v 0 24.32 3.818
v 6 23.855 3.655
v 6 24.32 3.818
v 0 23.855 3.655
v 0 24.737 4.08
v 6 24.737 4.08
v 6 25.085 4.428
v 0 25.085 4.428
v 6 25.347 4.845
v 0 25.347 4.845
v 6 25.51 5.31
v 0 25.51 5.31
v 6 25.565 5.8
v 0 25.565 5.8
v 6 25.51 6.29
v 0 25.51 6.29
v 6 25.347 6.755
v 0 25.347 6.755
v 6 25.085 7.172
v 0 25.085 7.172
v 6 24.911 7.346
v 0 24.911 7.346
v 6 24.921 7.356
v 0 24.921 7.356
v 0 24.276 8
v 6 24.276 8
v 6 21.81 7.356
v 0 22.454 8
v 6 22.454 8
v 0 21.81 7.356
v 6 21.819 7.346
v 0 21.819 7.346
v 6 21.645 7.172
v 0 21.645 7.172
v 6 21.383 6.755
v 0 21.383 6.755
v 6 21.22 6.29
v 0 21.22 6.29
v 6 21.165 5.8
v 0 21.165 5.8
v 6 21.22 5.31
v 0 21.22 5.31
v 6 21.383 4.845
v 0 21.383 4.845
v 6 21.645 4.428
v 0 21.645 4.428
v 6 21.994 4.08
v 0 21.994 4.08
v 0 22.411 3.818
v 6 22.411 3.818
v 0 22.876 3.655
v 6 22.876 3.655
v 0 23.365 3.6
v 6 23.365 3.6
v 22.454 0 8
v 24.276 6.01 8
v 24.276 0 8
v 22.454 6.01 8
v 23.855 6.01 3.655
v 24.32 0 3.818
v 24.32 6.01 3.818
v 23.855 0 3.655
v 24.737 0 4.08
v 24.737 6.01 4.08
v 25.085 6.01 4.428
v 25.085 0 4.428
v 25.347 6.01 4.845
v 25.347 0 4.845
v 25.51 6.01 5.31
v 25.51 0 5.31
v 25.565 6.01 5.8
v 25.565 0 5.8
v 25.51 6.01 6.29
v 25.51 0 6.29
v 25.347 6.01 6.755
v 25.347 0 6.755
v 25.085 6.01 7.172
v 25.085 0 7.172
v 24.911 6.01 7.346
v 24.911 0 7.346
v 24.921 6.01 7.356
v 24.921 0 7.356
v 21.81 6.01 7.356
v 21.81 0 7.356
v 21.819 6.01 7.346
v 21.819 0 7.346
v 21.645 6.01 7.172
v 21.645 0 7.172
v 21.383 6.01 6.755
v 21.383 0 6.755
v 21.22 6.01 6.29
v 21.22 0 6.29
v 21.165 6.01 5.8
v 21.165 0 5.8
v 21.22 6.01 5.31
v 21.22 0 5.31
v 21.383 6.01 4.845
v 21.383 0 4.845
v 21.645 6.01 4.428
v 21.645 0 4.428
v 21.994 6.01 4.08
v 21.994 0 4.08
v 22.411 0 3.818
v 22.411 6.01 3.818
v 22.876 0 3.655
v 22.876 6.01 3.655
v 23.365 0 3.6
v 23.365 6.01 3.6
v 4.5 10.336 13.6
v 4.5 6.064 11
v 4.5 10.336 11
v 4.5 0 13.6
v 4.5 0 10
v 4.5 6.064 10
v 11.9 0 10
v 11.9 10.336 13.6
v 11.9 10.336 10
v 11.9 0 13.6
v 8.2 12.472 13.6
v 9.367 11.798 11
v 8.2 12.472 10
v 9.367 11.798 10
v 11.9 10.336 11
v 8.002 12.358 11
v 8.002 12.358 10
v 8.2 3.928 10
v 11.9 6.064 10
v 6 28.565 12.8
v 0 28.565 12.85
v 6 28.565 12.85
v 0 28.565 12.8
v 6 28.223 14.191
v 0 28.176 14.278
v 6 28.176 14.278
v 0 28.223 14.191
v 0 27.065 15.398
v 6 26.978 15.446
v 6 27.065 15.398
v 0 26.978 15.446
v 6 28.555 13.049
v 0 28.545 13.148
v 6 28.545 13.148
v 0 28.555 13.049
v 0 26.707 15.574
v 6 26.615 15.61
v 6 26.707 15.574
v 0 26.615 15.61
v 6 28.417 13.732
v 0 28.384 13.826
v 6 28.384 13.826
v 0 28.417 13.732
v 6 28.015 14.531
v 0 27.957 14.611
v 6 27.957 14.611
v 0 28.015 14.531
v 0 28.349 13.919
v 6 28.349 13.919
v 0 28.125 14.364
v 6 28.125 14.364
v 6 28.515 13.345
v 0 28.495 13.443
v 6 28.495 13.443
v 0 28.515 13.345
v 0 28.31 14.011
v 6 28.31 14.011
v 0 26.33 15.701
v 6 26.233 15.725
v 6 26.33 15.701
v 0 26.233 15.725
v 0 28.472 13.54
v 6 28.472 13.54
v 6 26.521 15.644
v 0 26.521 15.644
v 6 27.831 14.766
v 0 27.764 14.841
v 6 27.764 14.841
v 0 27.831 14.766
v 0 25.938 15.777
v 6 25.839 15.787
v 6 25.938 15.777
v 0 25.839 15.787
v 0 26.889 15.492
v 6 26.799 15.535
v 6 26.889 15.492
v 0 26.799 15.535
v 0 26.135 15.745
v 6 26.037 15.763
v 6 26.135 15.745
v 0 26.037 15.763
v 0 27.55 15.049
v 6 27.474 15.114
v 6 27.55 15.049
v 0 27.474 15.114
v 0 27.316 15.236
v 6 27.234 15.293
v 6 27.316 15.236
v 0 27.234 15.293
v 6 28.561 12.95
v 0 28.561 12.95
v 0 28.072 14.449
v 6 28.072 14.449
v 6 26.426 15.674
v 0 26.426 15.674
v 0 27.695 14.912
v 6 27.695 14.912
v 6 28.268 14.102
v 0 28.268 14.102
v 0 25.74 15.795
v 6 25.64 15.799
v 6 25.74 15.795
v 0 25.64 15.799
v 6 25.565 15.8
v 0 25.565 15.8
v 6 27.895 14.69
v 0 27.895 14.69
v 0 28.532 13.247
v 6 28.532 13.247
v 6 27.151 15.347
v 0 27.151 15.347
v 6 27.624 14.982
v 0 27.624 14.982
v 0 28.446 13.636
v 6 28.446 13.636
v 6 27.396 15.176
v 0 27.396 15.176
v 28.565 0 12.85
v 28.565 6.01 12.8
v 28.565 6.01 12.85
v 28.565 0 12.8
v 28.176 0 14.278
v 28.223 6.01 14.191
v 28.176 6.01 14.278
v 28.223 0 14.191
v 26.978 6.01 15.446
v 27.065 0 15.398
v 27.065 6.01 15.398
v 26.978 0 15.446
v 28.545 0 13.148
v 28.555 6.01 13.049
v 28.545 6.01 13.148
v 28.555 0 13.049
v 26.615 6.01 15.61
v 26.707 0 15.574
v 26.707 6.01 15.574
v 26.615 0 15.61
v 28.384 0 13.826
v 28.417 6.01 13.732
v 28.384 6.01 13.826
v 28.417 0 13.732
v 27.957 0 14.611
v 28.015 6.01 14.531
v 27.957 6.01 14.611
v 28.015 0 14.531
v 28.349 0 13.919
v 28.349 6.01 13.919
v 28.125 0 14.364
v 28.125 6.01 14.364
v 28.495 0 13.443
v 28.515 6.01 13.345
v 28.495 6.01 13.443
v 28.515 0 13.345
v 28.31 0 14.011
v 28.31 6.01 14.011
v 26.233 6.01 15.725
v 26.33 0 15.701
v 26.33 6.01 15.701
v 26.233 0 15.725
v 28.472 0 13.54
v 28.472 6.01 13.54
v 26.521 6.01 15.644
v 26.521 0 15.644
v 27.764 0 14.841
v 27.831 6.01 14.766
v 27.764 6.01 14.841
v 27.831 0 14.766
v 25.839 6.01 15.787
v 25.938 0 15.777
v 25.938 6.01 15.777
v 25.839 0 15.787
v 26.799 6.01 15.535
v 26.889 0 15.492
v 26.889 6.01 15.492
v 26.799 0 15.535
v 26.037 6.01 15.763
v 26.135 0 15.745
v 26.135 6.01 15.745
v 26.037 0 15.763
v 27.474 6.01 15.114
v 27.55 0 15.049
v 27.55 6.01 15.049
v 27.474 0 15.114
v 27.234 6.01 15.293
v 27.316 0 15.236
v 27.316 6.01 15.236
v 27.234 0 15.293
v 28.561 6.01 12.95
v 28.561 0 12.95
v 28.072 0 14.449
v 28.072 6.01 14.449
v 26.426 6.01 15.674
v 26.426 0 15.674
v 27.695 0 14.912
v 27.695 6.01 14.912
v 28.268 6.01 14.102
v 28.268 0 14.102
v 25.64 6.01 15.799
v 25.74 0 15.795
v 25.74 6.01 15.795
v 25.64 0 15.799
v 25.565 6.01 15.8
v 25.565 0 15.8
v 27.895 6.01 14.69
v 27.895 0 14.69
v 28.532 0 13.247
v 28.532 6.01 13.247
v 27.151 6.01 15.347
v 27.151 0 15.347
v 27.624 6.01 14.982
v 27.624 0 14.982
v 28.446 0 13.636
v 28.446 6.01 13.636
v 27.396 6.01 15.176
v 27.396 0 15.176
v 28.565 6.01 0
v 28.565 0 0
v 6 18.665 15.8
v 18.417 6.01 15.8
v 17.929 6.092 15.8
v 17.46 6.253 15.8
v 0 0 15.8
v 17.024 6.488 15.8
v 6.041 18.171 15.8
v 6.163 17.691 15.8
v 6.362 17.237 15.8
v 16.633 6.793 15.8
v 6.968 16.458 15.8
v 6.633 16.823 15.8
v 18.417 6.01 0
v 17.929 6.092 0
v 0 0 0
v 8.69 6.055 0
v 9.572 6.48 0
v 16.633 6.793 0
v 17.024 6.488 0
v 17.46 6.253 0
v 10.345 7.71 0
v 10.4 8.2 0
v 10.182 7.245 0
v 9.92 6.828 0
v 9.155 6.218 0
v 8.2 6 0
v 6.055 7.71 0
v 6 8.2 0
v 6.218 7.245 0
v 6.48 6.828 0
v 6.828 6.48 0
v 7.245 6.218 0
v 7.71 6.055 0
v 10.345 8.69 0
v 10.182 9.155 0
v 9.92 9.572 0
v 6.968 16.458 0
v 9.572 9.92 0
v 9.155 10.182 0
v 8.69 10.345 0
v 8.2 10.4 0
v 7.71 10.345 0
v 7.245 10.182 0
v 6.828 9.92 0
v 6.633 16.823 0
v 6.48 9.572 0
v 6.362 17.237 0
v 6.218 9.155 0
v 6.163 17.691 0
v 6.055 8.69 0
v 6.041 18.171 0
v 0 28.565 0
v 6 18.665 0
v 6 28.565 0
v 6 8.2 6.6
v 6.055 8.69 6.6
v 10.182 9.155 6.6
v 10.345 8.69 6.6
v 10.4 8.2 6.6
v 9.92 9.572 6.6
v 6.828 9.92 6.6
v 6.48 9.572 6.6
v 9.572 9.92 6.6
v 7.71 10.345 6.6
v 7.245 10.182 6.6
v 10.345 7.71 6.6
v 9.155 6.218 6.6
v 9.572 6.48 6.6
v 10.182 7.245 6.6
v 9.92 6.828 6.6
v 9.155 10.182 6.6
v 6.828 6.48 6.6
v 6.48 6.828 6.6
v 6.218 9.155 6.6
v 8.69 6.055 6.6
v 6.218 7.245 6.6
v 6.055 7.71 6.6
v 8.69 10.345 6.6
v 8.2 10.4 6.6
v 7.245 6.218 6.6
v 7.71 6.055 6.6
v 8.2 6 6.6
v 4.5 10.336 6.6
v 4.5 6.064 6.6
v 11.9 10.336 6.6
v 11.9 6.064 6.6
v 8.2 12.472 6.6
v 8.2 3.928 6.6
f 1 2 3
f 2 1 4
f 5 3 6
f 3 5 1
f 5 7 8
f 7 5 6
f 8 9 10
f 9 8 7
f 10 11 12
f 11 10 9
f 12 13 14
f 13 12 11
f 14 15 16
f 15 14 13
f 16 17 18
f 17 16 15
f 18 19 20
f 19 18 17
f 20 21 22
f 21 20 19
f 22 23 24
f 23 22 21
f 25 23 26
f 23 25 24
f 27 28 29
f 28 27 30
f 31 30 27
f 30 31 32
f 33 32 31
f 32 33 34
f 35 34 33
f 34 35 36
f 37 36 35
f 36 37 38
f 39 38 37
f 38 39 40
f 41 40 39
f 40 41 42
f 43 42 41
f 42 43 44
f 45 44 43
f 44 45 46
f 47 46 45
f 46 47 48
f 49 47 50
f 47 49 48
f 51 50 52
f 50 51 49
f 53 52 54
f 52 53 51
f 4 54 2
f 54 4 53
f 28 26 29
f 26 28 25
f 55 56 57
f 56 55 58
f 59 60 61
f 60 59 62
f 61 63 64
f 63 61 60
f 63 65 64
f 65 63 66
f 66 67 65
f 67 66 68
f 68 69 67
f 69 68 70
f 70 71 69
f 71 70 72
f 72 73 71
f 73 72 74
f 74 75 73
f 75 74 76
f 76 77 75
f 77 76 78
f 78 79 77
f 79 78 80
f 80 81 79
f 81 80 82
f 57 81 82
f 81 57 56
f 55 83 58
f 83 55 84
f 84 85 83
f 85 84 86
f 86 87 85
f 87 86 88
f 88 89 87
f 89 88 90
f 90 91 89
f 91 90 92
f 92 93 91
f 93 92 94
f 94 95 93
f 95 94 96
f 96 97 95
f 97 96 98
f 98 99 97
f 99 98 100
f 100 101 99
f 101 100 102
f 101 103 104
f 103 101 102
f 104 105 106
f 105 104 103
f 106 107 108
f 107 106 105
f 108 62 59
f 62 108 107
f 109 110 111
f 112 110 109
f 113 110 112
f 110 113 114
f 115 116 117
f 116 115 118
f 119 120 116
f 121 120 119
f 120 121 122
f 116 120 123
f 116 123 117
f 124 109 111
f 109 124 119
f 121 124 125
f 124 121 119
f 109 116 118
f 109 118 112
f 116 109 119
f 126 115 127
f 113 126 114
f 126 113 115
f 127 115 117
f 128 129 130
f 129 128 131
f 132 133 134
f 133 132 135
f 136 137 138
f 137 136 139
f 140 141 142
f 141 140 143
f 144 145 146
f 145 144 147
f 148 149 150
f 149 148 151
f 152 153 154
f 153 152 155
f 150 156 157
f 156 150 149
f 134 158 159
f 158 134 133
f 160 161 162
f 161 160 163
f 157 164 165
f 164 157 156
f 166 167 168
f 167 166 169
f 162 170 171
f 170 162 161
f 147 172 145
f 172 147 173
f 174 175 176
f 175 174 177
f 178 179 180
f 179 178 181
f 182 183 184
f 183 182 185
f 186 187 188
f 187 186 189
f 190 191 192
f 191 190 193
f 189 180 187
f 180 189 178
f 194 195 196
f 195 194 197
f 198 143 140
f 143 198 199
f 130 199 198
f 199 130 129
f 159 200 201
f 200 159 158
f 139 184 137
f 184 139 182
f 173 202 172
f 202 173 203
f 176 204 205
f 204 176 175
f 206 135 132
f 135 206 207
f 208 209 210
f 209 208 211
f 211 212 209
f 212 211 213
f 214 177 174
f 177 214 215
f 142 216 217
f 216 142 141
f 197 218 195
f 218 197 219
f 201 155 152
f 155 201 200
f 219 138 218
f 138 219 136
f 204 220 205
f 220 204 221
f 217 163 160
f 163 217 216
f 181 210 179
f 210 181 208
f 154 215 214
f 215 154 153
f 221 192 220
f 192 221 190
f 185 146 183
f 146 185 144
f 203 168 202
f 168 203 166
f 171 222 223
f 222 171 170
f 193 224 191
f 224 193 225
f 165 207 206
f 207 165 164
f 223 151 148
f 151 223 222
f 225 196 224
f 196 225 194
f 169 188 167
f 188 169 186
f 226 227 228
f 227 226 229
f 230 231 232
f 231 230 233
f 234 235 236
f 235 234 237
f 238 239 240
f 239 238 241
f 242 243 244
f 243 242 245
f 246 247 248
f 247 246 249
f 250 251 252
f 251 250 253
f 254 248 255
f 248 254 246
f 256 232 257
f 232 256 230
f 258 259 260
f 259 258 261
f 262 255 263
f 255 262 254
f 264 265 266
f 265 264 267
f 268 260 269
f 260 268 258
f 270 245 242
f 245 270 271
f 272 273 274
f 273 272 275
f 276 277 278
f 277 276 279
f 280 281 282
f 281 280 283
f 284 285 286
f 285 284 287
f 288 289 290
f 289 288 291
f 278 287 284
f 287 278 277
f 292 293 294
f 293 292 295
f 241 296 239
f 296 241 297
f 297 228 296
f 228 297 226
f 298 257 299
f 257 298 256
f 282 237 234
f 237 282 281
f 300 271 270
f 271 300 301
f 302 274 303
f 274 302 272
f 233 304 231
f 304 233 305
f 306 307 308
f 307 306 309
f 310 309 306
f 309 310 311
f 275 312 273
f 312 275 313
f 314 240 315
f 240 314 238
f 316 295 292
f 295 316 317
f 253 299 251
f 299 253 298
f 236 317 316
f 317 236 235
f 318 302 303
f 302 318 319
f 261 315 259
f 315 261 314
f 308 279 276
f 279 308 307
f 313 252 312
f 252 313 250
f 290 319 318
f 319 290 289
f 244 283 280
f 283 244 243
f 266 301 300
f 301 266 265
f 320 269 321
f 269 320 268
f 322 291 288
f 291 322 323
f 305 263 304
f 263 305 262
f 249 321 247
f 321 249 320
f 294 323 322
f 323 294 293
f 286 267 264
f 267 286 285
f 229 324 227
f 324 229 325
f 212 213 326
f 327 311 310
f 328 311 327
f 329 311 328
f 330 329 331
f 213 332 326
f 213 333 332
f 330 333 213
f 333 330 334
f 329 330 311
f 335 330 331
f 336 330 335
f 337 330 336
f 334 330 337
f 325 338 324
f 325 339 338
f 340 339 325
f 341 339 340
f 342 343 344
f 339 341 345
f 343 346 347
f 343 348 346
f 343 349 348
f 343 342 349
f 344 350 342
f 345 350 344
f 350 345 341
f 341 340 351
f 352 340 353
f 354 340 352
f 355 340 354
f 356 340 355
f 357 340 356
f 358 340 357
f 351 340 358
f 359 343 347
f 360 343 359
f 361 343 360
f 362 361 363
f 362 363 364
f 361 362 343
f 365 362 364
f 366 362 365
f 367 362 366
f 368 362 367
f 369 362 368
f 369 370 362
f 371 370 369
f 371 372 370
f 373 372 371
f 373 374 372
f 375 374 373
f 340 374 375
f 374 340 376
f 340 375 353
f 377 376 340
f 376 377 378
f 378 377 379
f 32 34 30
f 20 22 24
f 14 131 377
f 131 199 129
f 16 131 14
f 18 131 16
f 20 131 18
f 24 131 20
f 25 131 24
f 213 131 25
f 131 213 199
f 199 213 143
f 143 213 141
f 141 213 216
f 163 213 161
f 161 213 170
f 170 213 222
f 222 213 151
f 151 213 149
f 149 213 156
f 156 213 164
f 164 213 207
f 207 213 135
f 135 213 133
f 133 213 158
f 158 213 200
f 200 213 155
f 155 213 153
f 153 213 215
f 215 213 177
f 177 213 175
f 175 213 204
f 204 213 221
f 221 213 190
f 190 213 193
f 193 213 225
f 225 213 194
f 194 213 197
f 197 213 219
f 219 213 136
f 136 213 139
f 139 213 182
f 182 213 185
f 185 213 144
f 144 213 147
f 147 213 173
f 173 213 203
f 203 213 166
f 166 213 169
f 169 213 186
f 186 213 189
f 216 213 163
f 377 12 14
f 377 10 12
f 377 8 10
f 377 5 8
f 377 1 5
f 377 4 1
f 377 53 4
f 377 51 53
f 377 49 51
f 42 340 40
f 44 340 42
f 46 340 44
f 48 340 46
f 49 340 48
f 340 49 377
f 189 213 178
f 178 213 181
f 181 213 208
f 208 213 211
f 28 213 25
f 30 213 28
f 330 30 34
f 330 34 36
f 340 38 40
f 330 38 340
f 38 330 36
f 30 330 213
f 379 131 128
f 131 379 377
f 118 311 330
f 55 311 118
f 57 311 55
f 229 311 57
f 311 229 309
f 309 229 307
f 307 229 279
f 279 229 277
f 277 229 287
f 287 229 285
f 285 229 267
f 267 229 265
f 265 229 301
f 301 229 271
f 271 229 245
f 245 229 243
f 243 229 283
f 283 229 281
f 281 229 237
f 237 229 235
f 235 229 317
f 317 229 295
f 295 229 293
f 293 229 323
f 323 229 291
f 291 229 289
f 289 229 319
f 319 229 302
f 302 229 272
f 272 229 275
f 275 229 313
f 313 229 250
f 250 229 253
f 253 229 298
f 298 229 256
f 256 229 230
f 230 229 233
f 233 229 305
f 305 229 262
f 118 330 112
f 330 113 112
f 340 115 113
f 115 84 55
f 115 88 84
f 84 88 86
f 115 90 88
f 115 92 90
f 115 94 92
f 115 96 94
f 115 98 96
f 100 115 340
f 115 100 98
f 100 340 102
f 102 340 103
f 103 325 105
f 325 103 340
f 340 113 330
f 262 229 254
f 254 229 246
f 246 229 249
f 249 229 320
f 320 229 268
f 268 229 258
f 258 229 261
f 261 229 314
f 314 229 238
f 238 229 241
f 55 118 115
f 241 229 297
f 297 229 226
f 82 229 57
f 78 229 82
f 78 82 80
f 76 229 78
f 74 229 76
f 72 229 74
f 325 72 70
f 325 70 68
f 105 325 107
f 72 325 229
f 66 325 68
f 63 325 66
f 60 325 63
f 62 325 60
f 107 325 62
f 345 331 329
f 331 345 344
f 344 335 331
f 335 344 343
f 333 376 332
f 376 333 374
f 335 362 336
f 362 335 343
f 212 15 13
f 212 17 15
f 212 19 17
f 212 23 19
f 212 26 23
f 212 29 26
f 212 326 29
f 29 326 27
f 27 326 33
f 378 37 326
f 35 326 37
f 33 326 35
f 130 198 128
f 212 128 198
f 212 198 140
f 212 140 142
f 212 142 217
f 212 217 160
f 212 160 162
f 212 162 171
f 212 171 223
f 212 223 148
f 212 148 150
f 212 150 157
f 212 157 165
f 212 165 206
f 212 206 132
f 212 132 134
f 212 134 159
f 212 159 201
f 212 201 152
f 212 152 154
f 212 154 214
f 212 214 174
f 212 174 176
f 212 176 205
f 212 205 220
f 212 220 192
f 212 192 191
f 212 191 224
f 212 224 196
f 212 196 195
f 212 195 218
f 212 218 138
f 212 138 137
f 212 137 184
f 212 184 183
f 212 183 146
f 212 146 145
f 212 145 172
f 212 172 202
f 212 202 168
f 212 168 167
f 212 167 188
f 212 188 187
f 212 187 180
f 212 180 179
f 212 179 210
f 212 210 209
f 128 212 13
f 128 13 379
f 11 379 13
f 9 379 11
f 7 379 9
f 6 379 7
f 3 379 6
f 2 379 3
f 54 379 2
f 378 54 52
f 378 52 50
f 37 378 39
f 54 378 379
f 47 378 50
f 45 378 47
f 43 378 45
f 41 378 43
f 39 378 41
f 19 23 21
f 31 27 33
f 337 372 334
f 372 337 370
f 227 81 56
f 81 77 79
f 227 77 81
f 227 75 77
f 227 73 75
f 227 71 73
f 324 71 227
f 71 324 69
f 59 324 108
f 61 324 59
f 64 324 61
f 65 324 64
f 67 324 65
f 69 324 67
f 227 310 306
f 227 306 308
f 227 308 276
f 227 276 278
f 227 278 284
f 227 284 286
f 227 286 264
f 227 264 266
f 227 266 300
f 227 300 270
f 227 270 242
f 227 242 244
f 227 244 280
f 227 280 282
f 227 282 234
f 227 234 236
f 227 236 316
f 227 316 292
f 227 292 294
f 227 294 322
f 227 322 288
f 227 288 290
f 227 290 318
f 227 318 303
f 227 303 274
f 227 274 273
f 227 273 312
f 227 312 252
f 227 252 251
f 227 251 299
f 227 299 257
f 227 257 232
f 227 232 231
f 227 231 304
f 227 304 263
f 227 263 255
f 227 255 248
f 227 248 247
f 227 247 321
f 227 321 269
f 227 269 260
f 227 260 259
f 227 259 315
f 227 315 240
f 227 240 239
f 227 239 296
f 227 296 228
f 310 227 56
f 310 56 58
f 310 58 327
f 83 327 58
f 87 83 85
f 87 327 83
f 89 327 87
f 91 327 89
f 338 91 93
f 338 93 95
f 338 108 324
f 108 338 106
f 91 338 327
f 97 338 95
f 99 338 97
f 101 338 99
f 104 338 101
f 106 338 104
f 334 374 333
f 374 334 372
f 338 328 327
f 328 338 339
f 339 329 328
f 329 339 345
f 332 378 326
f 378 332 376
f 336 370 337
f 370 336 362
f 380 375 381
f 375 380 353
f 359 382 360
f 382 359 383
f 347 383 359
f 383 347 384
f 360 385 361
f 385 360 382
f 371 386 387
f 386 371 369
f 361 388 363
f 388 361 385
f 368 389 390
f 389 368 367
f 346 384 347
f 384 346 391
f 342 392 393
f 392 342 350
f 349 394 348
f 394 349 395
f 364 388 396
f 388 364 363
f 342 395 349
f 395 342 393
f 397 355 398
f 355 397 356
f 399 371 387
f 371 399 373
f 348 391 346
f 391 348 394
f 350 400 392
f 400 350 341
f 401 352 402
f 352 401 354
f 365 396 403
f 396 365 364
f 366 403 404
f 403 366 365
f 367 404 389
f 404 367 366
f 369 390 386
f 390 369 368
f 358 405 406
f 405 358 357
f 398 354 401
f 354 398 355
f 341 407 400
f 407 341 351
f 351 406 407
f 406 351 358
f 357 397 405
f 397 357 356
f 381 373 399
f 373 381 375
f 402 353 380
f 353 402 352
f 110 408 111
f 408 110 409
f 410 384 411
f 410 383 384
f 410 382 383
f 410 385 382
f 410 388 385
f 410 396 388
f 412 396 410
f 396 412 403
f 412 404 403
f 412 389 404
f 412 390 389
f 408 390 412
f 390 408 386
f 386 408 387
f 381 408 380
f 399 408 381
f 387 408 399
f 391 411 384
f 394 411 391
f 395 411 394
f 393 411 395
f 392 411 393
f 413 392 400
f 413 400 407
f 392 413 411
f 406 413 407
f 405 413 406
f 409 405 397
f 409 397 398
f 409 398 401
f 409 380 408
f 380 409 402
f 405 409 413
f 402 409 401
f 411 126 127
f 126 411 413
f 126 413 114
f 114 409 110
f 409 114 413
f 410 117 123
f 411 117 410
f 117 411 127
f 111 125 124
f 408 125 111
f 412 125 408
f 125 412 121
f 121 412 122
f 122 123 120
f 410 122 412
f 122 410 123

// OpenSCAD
// file: functions.scad
/*******************************************************************

This OpenSCAD code and its rendered 3D model are part of the

	Kühling&Kühling RepRap Industrial 3D Printer


All details, BOM, assembling instructions and latest sources:
	http://kuehlingkuehling.de

Designed and developed by:
	Jonas Kühling <mail@jonaskuehling.de>
	Simon Kühling <mail@simonkuehling.de>

Licensed under:
	Creative Commons Attribution-ShareAlike
	CC BY-SA 3.0
	http://creativecommons.org/licenses/by-sa/3.0/

*******************************************************************/

module teardrop (r=4.5,h=20,alpha=45,teardropcorner=0,fulldrop=0){		// tear drop hole for top-centering
											// use teardropcorner=1 for bottom horizontal corners
	render()
	translate([-h/2,0,0])
		rotate([-270,0+(teardropcorner*180),90])
			difference(){
				linear_extrude(height=h){
					circle(r);
					polygon(points=[[0,0],[r*cos(alpha),r*sin(alpha)],[0,r/sin(alpha)],[-r*cos(alpha),r*sin(alpha)]], paths=[[0,1,2,3]]);
				}
				if(fulldrop==0) 
					translate([0,(r/sin(alpha))/2+r,h/2]) cube([2*r+2,r/sin(alpha),h+2],center=true);
			}
}

//teardrop(4.5,22,fulldrop=true);



module teardropcentering (r=4.5,h=20,alpha=45){				// tear drop hole for top-centering
	centering_offset_factor = 1.1;
	render()
	translate([-h/2,0,0])
		rotate([-270,0,90])
			difference(){
				linear_extrude(height=h){
					circle(r, $fn=24);
					polygon(points=[[0,0],[r*cos(alpha),r*sin(alpha)],[0,r/sin(alpha)],[-r*cos(alpha),r*sin(alpha)]], paths=[[0,1,2,3]]);
				}
				translate([0,(r/sin(alpha))/2+r*centering_offset_factor,h/2]) cube([2*r+2,r/sin(alpha),h+2],center=true);
			}
}

//teardropcentering();



module teardropcentering_half (r=4.5,h=20, bottom=0,alpha=45){				// tear drop hole for top-centering
																// upper half (bottom=0) or bottom half (bottom=1)
	centering_offset_factor = 1.2;
	render()
	translate([-h/2,0,0])
		rotate([-270,0,90])
			difference(){
				linear_extrude(height=h){
					circle(r, $fn=24);
					polygon(points=[[0,0],[r*cos(alpha),r*sin(alpha)],[0,r/sin(alpha)],[-r*cos(alpha),r*sin(alpha)]], paths=[[0,1,2,3]]);
				}
				translate([0,(r/sin(alpha))/2+r*centering_offset_factor,h/2]) cube([2*r+2,r/sin(alpha),h+2],center=true);
				translate([0,-(r*centering_offset_factor)/2-0.5+bottom*(r*centering_offset_factor+1),h/2]) cube([2*r+2,r*centering_offset_factor+1,h+2],center=true);
			}
}

//teardropcentering_half(bottom=0);


module polyhole(d,h){
	n = max(round(2 * d),3);
	cylinder(h = h, r = (d / 2) / cos (180 / n), $fn = n, center=true);
}



module roundcorner(radius,edge_length){
	render()
	translate([0,0,-1])
		difference(){
			translate([-1,-1,0])
				cube(size = [radius+1,radius+1,edge_length+2], center = false);
			translate(v = [radius,radius,-1])
				cylinder(h = edge_length+4, r=radius, center=false,$fs=0.1);
		}
}

//roundcorner(5,5);



module roundcorner_tear(radius,edge_length){
	render()
	difference(){
		translate([-1,-1,-1])
			cube(size = [edge_length+2, radius+1, radius+1], center = false);
		translate([(edge_length+4)/2-2, radius, radius])
			teardrop(radius, edge_length+4,teardropcorner=1);
	}
}

//roundcorner_tear(8,20);


module roundedge_tear(radius){
	render()
	difference(){
		translate([-1,-1,-1])
			cube(size = [radius+1, radius+1, radius+1], center = false);
		translate([radius,radius,radius])
			union(){
				sphere(r=radius, $fs=0.1);
				translate([0,0,-radius])
					cylinder(r1=(radius*sin(45))-(radius-(radius*sin(45))),r2=radius*sin(45),h=(radius-(radius*sin(45))), $fs=0.1);
			}
	}
}

//roundedge_tear(20);



module roundedge(radius){
	render()
	difference(){
		translate([-1,-1,-1])
			cube(size = [radius+1, radius+1, radius+1], center = false);
		translate([radius,radius,radius])
			sphere(r=radius, $fs=0.1);
	}
}

//roundedge(5);


module nut_trap(nut_wrench_size,trap_height,vertical=0, clearance=0.2,center=true){		// M3 wrench size = 5.5
	radius = cornerdiameter(nut_wrench_size+2*clearance) /2;
	rotate([0,vertical*90,0])
		cylinder(h = trap_height, r = radius, center=center, $fn = 6);
}

//nut_trap(5,5,0);

module nut_slot(nut_wrench_size,nut_height, nut_elevation,vertical=0, clearance=0.2){		// M3 wrench size = 5.5
	radius = cornerdiameter(nut_wrench_size+2*clearance) /2;
	slot_height = nut_height+2*clearance;
	slot_width = nut_wrench_size+2*clearance;
	rotate([0,vertical*270,0]){
		cylinder(h = slot_height, r = radius, center=true, $fn = 6);
		translate([0,-slot_width/2,-slot_height/2]) cube([nut_elevation+1,slot_width,slot_height]);
	}
}

//nut_slot(5.5,3,4,1);

function cornerdiameter(wrench_size) =  2* ((wrench_size)/2)/ cos(180/6);
function cornerdiameter_8(wrench_size) =  2* ((wrench_size)/2)/ cos(180/8);
// main file
/*******************************************************************

This OpenSCAD code and its rendered 3D model are part of the

	Kühling&Kühling RepRap Industrial 3D Printer


All details, BOM, assembling instructions and latest sources:
	http://kuehlingkuehling.de

Designed and developed by:
	Jonas Kühling <mail@jonaskuehling.de>
	Simon Kühling <mail@simonkuehling.de>

Licensed under:
	Creative Commons Attribution-ShareAlike
	CC BY-SA 3.0
	http://creativecommons.org/licenses/by-sa/3.0/

*******************************************************************/

include <configuration.scad>



angle();



module angle(){
	difference(){
		union(){

			// main body
			cube([frame_angle_side,frame_angle_side,frame_angle_width]);
		}

		// cut off
		hull(){
			translate([2*wall+wall,2*wall+(frame_screw_dia+2*clearance)+(((frame_screw_dia/2+clearance)+wall)/sin(45))+((frame_screw_dia/2+clearance)/sin(45)-(frame_screw_dia/2+clearance)),-1])
				cylinder(r=wall,h=frame_angle_width+2);
			translate([2*wall+(frame_screw_dia+2*clearance)+(((frame_screw_dia/2+clearance)+wall)/sin(45))+((frame_screw_dia/2+clearance)/sin(45)-(frame_screw_dia/2+clearance)),2*wall+wall,-1])
				cylinder(r=wall,h=frame_angle_width+2);
			translate([2*wall+wall,frame_angle_side+wall,-1])
				cylinder(r=wall,h=frame_angle_width+2);
			translate([frame_angle_side+wall,2*wall+wall,-1])
				cylinder(r=wall,h=frame_angle_width+2);
			translate([frame_angle_side+wall,frame_angle_side+wall,-1])
				cylinder(r=wall,h=frame_angle_width+2);

		}

		// frame mount screw holes
		for(i=[0,1])
			rotate([0,0,i*(-90)])
				mirror([i,0,0]){
					translate([frame_angle_side/2,frame_angle_side-(wall+clearance+frame_screw_dia/2),frame_angle_width-frame_width/2])
						teardrop(frame_screw_dia/2+clearance,frame_angle_side+2);
// for OLD version with two screws for each side
//					translate([frame_angle_side/2,frame_angle_side-(wall+clearance+frame_screw_dia/2+frame_screw_washer_dia/2+wall+frame_screw_washer_dia/2),frame_angle_width-frame_width/2])
//						teardrop(frame_screw_dia/2+clearance,frame_angle_side+2);
				}

		// frame enclosure mount hole + nut trap
		translate([2*wall+clearance+frame_screw_dia/2,2*wall+clearance+frame_screw_dia/2,frame_angle_width-frame_width-frame_screw_washer_thickness])
			cylinder(r=frame_screw_dia/2+clearance,h=frame_enclosure_screw_length);
		translate([2*wall+clearance+frame_screw_dia/2,2*wall+clearance+frame_screw_dia/2,frame_angle_width-frame_width+frame_enclosure_screw_length-frame_screw_washer_thickness-(frame_screw_nut_height+clearance+1)/2+1])
			rotate([0,0,-90])
				nut_trap(frame_screw_nut_wrench,frame_screw_nut_height+clearance+1);
		translate([2*wall+clearance+frame_screw_dia/2,2*wall+clearance+frame_screw_dia/2,frame_angle_width-frame_width+frame_enclosure_screw_length-frame_screw_washer_thickness+(frame_screw_nut_height+2*clearance)/2])
			rotate([0,0,-90])
				nut_slot(frame_screw_nut_wrench,frame_screw_nut_height,frame_angle_side);

		// round corners
		for(i=[0,1])
			rotate([0,0,i*(-90)])
				mirror([i,0,0])
					translate([0,frame_angle_side,frame_angle_width])
						rotate([-90,0,0]) rotate([0,90,0])
							roundcorner(wall,frame_angle_side);

	}


}
